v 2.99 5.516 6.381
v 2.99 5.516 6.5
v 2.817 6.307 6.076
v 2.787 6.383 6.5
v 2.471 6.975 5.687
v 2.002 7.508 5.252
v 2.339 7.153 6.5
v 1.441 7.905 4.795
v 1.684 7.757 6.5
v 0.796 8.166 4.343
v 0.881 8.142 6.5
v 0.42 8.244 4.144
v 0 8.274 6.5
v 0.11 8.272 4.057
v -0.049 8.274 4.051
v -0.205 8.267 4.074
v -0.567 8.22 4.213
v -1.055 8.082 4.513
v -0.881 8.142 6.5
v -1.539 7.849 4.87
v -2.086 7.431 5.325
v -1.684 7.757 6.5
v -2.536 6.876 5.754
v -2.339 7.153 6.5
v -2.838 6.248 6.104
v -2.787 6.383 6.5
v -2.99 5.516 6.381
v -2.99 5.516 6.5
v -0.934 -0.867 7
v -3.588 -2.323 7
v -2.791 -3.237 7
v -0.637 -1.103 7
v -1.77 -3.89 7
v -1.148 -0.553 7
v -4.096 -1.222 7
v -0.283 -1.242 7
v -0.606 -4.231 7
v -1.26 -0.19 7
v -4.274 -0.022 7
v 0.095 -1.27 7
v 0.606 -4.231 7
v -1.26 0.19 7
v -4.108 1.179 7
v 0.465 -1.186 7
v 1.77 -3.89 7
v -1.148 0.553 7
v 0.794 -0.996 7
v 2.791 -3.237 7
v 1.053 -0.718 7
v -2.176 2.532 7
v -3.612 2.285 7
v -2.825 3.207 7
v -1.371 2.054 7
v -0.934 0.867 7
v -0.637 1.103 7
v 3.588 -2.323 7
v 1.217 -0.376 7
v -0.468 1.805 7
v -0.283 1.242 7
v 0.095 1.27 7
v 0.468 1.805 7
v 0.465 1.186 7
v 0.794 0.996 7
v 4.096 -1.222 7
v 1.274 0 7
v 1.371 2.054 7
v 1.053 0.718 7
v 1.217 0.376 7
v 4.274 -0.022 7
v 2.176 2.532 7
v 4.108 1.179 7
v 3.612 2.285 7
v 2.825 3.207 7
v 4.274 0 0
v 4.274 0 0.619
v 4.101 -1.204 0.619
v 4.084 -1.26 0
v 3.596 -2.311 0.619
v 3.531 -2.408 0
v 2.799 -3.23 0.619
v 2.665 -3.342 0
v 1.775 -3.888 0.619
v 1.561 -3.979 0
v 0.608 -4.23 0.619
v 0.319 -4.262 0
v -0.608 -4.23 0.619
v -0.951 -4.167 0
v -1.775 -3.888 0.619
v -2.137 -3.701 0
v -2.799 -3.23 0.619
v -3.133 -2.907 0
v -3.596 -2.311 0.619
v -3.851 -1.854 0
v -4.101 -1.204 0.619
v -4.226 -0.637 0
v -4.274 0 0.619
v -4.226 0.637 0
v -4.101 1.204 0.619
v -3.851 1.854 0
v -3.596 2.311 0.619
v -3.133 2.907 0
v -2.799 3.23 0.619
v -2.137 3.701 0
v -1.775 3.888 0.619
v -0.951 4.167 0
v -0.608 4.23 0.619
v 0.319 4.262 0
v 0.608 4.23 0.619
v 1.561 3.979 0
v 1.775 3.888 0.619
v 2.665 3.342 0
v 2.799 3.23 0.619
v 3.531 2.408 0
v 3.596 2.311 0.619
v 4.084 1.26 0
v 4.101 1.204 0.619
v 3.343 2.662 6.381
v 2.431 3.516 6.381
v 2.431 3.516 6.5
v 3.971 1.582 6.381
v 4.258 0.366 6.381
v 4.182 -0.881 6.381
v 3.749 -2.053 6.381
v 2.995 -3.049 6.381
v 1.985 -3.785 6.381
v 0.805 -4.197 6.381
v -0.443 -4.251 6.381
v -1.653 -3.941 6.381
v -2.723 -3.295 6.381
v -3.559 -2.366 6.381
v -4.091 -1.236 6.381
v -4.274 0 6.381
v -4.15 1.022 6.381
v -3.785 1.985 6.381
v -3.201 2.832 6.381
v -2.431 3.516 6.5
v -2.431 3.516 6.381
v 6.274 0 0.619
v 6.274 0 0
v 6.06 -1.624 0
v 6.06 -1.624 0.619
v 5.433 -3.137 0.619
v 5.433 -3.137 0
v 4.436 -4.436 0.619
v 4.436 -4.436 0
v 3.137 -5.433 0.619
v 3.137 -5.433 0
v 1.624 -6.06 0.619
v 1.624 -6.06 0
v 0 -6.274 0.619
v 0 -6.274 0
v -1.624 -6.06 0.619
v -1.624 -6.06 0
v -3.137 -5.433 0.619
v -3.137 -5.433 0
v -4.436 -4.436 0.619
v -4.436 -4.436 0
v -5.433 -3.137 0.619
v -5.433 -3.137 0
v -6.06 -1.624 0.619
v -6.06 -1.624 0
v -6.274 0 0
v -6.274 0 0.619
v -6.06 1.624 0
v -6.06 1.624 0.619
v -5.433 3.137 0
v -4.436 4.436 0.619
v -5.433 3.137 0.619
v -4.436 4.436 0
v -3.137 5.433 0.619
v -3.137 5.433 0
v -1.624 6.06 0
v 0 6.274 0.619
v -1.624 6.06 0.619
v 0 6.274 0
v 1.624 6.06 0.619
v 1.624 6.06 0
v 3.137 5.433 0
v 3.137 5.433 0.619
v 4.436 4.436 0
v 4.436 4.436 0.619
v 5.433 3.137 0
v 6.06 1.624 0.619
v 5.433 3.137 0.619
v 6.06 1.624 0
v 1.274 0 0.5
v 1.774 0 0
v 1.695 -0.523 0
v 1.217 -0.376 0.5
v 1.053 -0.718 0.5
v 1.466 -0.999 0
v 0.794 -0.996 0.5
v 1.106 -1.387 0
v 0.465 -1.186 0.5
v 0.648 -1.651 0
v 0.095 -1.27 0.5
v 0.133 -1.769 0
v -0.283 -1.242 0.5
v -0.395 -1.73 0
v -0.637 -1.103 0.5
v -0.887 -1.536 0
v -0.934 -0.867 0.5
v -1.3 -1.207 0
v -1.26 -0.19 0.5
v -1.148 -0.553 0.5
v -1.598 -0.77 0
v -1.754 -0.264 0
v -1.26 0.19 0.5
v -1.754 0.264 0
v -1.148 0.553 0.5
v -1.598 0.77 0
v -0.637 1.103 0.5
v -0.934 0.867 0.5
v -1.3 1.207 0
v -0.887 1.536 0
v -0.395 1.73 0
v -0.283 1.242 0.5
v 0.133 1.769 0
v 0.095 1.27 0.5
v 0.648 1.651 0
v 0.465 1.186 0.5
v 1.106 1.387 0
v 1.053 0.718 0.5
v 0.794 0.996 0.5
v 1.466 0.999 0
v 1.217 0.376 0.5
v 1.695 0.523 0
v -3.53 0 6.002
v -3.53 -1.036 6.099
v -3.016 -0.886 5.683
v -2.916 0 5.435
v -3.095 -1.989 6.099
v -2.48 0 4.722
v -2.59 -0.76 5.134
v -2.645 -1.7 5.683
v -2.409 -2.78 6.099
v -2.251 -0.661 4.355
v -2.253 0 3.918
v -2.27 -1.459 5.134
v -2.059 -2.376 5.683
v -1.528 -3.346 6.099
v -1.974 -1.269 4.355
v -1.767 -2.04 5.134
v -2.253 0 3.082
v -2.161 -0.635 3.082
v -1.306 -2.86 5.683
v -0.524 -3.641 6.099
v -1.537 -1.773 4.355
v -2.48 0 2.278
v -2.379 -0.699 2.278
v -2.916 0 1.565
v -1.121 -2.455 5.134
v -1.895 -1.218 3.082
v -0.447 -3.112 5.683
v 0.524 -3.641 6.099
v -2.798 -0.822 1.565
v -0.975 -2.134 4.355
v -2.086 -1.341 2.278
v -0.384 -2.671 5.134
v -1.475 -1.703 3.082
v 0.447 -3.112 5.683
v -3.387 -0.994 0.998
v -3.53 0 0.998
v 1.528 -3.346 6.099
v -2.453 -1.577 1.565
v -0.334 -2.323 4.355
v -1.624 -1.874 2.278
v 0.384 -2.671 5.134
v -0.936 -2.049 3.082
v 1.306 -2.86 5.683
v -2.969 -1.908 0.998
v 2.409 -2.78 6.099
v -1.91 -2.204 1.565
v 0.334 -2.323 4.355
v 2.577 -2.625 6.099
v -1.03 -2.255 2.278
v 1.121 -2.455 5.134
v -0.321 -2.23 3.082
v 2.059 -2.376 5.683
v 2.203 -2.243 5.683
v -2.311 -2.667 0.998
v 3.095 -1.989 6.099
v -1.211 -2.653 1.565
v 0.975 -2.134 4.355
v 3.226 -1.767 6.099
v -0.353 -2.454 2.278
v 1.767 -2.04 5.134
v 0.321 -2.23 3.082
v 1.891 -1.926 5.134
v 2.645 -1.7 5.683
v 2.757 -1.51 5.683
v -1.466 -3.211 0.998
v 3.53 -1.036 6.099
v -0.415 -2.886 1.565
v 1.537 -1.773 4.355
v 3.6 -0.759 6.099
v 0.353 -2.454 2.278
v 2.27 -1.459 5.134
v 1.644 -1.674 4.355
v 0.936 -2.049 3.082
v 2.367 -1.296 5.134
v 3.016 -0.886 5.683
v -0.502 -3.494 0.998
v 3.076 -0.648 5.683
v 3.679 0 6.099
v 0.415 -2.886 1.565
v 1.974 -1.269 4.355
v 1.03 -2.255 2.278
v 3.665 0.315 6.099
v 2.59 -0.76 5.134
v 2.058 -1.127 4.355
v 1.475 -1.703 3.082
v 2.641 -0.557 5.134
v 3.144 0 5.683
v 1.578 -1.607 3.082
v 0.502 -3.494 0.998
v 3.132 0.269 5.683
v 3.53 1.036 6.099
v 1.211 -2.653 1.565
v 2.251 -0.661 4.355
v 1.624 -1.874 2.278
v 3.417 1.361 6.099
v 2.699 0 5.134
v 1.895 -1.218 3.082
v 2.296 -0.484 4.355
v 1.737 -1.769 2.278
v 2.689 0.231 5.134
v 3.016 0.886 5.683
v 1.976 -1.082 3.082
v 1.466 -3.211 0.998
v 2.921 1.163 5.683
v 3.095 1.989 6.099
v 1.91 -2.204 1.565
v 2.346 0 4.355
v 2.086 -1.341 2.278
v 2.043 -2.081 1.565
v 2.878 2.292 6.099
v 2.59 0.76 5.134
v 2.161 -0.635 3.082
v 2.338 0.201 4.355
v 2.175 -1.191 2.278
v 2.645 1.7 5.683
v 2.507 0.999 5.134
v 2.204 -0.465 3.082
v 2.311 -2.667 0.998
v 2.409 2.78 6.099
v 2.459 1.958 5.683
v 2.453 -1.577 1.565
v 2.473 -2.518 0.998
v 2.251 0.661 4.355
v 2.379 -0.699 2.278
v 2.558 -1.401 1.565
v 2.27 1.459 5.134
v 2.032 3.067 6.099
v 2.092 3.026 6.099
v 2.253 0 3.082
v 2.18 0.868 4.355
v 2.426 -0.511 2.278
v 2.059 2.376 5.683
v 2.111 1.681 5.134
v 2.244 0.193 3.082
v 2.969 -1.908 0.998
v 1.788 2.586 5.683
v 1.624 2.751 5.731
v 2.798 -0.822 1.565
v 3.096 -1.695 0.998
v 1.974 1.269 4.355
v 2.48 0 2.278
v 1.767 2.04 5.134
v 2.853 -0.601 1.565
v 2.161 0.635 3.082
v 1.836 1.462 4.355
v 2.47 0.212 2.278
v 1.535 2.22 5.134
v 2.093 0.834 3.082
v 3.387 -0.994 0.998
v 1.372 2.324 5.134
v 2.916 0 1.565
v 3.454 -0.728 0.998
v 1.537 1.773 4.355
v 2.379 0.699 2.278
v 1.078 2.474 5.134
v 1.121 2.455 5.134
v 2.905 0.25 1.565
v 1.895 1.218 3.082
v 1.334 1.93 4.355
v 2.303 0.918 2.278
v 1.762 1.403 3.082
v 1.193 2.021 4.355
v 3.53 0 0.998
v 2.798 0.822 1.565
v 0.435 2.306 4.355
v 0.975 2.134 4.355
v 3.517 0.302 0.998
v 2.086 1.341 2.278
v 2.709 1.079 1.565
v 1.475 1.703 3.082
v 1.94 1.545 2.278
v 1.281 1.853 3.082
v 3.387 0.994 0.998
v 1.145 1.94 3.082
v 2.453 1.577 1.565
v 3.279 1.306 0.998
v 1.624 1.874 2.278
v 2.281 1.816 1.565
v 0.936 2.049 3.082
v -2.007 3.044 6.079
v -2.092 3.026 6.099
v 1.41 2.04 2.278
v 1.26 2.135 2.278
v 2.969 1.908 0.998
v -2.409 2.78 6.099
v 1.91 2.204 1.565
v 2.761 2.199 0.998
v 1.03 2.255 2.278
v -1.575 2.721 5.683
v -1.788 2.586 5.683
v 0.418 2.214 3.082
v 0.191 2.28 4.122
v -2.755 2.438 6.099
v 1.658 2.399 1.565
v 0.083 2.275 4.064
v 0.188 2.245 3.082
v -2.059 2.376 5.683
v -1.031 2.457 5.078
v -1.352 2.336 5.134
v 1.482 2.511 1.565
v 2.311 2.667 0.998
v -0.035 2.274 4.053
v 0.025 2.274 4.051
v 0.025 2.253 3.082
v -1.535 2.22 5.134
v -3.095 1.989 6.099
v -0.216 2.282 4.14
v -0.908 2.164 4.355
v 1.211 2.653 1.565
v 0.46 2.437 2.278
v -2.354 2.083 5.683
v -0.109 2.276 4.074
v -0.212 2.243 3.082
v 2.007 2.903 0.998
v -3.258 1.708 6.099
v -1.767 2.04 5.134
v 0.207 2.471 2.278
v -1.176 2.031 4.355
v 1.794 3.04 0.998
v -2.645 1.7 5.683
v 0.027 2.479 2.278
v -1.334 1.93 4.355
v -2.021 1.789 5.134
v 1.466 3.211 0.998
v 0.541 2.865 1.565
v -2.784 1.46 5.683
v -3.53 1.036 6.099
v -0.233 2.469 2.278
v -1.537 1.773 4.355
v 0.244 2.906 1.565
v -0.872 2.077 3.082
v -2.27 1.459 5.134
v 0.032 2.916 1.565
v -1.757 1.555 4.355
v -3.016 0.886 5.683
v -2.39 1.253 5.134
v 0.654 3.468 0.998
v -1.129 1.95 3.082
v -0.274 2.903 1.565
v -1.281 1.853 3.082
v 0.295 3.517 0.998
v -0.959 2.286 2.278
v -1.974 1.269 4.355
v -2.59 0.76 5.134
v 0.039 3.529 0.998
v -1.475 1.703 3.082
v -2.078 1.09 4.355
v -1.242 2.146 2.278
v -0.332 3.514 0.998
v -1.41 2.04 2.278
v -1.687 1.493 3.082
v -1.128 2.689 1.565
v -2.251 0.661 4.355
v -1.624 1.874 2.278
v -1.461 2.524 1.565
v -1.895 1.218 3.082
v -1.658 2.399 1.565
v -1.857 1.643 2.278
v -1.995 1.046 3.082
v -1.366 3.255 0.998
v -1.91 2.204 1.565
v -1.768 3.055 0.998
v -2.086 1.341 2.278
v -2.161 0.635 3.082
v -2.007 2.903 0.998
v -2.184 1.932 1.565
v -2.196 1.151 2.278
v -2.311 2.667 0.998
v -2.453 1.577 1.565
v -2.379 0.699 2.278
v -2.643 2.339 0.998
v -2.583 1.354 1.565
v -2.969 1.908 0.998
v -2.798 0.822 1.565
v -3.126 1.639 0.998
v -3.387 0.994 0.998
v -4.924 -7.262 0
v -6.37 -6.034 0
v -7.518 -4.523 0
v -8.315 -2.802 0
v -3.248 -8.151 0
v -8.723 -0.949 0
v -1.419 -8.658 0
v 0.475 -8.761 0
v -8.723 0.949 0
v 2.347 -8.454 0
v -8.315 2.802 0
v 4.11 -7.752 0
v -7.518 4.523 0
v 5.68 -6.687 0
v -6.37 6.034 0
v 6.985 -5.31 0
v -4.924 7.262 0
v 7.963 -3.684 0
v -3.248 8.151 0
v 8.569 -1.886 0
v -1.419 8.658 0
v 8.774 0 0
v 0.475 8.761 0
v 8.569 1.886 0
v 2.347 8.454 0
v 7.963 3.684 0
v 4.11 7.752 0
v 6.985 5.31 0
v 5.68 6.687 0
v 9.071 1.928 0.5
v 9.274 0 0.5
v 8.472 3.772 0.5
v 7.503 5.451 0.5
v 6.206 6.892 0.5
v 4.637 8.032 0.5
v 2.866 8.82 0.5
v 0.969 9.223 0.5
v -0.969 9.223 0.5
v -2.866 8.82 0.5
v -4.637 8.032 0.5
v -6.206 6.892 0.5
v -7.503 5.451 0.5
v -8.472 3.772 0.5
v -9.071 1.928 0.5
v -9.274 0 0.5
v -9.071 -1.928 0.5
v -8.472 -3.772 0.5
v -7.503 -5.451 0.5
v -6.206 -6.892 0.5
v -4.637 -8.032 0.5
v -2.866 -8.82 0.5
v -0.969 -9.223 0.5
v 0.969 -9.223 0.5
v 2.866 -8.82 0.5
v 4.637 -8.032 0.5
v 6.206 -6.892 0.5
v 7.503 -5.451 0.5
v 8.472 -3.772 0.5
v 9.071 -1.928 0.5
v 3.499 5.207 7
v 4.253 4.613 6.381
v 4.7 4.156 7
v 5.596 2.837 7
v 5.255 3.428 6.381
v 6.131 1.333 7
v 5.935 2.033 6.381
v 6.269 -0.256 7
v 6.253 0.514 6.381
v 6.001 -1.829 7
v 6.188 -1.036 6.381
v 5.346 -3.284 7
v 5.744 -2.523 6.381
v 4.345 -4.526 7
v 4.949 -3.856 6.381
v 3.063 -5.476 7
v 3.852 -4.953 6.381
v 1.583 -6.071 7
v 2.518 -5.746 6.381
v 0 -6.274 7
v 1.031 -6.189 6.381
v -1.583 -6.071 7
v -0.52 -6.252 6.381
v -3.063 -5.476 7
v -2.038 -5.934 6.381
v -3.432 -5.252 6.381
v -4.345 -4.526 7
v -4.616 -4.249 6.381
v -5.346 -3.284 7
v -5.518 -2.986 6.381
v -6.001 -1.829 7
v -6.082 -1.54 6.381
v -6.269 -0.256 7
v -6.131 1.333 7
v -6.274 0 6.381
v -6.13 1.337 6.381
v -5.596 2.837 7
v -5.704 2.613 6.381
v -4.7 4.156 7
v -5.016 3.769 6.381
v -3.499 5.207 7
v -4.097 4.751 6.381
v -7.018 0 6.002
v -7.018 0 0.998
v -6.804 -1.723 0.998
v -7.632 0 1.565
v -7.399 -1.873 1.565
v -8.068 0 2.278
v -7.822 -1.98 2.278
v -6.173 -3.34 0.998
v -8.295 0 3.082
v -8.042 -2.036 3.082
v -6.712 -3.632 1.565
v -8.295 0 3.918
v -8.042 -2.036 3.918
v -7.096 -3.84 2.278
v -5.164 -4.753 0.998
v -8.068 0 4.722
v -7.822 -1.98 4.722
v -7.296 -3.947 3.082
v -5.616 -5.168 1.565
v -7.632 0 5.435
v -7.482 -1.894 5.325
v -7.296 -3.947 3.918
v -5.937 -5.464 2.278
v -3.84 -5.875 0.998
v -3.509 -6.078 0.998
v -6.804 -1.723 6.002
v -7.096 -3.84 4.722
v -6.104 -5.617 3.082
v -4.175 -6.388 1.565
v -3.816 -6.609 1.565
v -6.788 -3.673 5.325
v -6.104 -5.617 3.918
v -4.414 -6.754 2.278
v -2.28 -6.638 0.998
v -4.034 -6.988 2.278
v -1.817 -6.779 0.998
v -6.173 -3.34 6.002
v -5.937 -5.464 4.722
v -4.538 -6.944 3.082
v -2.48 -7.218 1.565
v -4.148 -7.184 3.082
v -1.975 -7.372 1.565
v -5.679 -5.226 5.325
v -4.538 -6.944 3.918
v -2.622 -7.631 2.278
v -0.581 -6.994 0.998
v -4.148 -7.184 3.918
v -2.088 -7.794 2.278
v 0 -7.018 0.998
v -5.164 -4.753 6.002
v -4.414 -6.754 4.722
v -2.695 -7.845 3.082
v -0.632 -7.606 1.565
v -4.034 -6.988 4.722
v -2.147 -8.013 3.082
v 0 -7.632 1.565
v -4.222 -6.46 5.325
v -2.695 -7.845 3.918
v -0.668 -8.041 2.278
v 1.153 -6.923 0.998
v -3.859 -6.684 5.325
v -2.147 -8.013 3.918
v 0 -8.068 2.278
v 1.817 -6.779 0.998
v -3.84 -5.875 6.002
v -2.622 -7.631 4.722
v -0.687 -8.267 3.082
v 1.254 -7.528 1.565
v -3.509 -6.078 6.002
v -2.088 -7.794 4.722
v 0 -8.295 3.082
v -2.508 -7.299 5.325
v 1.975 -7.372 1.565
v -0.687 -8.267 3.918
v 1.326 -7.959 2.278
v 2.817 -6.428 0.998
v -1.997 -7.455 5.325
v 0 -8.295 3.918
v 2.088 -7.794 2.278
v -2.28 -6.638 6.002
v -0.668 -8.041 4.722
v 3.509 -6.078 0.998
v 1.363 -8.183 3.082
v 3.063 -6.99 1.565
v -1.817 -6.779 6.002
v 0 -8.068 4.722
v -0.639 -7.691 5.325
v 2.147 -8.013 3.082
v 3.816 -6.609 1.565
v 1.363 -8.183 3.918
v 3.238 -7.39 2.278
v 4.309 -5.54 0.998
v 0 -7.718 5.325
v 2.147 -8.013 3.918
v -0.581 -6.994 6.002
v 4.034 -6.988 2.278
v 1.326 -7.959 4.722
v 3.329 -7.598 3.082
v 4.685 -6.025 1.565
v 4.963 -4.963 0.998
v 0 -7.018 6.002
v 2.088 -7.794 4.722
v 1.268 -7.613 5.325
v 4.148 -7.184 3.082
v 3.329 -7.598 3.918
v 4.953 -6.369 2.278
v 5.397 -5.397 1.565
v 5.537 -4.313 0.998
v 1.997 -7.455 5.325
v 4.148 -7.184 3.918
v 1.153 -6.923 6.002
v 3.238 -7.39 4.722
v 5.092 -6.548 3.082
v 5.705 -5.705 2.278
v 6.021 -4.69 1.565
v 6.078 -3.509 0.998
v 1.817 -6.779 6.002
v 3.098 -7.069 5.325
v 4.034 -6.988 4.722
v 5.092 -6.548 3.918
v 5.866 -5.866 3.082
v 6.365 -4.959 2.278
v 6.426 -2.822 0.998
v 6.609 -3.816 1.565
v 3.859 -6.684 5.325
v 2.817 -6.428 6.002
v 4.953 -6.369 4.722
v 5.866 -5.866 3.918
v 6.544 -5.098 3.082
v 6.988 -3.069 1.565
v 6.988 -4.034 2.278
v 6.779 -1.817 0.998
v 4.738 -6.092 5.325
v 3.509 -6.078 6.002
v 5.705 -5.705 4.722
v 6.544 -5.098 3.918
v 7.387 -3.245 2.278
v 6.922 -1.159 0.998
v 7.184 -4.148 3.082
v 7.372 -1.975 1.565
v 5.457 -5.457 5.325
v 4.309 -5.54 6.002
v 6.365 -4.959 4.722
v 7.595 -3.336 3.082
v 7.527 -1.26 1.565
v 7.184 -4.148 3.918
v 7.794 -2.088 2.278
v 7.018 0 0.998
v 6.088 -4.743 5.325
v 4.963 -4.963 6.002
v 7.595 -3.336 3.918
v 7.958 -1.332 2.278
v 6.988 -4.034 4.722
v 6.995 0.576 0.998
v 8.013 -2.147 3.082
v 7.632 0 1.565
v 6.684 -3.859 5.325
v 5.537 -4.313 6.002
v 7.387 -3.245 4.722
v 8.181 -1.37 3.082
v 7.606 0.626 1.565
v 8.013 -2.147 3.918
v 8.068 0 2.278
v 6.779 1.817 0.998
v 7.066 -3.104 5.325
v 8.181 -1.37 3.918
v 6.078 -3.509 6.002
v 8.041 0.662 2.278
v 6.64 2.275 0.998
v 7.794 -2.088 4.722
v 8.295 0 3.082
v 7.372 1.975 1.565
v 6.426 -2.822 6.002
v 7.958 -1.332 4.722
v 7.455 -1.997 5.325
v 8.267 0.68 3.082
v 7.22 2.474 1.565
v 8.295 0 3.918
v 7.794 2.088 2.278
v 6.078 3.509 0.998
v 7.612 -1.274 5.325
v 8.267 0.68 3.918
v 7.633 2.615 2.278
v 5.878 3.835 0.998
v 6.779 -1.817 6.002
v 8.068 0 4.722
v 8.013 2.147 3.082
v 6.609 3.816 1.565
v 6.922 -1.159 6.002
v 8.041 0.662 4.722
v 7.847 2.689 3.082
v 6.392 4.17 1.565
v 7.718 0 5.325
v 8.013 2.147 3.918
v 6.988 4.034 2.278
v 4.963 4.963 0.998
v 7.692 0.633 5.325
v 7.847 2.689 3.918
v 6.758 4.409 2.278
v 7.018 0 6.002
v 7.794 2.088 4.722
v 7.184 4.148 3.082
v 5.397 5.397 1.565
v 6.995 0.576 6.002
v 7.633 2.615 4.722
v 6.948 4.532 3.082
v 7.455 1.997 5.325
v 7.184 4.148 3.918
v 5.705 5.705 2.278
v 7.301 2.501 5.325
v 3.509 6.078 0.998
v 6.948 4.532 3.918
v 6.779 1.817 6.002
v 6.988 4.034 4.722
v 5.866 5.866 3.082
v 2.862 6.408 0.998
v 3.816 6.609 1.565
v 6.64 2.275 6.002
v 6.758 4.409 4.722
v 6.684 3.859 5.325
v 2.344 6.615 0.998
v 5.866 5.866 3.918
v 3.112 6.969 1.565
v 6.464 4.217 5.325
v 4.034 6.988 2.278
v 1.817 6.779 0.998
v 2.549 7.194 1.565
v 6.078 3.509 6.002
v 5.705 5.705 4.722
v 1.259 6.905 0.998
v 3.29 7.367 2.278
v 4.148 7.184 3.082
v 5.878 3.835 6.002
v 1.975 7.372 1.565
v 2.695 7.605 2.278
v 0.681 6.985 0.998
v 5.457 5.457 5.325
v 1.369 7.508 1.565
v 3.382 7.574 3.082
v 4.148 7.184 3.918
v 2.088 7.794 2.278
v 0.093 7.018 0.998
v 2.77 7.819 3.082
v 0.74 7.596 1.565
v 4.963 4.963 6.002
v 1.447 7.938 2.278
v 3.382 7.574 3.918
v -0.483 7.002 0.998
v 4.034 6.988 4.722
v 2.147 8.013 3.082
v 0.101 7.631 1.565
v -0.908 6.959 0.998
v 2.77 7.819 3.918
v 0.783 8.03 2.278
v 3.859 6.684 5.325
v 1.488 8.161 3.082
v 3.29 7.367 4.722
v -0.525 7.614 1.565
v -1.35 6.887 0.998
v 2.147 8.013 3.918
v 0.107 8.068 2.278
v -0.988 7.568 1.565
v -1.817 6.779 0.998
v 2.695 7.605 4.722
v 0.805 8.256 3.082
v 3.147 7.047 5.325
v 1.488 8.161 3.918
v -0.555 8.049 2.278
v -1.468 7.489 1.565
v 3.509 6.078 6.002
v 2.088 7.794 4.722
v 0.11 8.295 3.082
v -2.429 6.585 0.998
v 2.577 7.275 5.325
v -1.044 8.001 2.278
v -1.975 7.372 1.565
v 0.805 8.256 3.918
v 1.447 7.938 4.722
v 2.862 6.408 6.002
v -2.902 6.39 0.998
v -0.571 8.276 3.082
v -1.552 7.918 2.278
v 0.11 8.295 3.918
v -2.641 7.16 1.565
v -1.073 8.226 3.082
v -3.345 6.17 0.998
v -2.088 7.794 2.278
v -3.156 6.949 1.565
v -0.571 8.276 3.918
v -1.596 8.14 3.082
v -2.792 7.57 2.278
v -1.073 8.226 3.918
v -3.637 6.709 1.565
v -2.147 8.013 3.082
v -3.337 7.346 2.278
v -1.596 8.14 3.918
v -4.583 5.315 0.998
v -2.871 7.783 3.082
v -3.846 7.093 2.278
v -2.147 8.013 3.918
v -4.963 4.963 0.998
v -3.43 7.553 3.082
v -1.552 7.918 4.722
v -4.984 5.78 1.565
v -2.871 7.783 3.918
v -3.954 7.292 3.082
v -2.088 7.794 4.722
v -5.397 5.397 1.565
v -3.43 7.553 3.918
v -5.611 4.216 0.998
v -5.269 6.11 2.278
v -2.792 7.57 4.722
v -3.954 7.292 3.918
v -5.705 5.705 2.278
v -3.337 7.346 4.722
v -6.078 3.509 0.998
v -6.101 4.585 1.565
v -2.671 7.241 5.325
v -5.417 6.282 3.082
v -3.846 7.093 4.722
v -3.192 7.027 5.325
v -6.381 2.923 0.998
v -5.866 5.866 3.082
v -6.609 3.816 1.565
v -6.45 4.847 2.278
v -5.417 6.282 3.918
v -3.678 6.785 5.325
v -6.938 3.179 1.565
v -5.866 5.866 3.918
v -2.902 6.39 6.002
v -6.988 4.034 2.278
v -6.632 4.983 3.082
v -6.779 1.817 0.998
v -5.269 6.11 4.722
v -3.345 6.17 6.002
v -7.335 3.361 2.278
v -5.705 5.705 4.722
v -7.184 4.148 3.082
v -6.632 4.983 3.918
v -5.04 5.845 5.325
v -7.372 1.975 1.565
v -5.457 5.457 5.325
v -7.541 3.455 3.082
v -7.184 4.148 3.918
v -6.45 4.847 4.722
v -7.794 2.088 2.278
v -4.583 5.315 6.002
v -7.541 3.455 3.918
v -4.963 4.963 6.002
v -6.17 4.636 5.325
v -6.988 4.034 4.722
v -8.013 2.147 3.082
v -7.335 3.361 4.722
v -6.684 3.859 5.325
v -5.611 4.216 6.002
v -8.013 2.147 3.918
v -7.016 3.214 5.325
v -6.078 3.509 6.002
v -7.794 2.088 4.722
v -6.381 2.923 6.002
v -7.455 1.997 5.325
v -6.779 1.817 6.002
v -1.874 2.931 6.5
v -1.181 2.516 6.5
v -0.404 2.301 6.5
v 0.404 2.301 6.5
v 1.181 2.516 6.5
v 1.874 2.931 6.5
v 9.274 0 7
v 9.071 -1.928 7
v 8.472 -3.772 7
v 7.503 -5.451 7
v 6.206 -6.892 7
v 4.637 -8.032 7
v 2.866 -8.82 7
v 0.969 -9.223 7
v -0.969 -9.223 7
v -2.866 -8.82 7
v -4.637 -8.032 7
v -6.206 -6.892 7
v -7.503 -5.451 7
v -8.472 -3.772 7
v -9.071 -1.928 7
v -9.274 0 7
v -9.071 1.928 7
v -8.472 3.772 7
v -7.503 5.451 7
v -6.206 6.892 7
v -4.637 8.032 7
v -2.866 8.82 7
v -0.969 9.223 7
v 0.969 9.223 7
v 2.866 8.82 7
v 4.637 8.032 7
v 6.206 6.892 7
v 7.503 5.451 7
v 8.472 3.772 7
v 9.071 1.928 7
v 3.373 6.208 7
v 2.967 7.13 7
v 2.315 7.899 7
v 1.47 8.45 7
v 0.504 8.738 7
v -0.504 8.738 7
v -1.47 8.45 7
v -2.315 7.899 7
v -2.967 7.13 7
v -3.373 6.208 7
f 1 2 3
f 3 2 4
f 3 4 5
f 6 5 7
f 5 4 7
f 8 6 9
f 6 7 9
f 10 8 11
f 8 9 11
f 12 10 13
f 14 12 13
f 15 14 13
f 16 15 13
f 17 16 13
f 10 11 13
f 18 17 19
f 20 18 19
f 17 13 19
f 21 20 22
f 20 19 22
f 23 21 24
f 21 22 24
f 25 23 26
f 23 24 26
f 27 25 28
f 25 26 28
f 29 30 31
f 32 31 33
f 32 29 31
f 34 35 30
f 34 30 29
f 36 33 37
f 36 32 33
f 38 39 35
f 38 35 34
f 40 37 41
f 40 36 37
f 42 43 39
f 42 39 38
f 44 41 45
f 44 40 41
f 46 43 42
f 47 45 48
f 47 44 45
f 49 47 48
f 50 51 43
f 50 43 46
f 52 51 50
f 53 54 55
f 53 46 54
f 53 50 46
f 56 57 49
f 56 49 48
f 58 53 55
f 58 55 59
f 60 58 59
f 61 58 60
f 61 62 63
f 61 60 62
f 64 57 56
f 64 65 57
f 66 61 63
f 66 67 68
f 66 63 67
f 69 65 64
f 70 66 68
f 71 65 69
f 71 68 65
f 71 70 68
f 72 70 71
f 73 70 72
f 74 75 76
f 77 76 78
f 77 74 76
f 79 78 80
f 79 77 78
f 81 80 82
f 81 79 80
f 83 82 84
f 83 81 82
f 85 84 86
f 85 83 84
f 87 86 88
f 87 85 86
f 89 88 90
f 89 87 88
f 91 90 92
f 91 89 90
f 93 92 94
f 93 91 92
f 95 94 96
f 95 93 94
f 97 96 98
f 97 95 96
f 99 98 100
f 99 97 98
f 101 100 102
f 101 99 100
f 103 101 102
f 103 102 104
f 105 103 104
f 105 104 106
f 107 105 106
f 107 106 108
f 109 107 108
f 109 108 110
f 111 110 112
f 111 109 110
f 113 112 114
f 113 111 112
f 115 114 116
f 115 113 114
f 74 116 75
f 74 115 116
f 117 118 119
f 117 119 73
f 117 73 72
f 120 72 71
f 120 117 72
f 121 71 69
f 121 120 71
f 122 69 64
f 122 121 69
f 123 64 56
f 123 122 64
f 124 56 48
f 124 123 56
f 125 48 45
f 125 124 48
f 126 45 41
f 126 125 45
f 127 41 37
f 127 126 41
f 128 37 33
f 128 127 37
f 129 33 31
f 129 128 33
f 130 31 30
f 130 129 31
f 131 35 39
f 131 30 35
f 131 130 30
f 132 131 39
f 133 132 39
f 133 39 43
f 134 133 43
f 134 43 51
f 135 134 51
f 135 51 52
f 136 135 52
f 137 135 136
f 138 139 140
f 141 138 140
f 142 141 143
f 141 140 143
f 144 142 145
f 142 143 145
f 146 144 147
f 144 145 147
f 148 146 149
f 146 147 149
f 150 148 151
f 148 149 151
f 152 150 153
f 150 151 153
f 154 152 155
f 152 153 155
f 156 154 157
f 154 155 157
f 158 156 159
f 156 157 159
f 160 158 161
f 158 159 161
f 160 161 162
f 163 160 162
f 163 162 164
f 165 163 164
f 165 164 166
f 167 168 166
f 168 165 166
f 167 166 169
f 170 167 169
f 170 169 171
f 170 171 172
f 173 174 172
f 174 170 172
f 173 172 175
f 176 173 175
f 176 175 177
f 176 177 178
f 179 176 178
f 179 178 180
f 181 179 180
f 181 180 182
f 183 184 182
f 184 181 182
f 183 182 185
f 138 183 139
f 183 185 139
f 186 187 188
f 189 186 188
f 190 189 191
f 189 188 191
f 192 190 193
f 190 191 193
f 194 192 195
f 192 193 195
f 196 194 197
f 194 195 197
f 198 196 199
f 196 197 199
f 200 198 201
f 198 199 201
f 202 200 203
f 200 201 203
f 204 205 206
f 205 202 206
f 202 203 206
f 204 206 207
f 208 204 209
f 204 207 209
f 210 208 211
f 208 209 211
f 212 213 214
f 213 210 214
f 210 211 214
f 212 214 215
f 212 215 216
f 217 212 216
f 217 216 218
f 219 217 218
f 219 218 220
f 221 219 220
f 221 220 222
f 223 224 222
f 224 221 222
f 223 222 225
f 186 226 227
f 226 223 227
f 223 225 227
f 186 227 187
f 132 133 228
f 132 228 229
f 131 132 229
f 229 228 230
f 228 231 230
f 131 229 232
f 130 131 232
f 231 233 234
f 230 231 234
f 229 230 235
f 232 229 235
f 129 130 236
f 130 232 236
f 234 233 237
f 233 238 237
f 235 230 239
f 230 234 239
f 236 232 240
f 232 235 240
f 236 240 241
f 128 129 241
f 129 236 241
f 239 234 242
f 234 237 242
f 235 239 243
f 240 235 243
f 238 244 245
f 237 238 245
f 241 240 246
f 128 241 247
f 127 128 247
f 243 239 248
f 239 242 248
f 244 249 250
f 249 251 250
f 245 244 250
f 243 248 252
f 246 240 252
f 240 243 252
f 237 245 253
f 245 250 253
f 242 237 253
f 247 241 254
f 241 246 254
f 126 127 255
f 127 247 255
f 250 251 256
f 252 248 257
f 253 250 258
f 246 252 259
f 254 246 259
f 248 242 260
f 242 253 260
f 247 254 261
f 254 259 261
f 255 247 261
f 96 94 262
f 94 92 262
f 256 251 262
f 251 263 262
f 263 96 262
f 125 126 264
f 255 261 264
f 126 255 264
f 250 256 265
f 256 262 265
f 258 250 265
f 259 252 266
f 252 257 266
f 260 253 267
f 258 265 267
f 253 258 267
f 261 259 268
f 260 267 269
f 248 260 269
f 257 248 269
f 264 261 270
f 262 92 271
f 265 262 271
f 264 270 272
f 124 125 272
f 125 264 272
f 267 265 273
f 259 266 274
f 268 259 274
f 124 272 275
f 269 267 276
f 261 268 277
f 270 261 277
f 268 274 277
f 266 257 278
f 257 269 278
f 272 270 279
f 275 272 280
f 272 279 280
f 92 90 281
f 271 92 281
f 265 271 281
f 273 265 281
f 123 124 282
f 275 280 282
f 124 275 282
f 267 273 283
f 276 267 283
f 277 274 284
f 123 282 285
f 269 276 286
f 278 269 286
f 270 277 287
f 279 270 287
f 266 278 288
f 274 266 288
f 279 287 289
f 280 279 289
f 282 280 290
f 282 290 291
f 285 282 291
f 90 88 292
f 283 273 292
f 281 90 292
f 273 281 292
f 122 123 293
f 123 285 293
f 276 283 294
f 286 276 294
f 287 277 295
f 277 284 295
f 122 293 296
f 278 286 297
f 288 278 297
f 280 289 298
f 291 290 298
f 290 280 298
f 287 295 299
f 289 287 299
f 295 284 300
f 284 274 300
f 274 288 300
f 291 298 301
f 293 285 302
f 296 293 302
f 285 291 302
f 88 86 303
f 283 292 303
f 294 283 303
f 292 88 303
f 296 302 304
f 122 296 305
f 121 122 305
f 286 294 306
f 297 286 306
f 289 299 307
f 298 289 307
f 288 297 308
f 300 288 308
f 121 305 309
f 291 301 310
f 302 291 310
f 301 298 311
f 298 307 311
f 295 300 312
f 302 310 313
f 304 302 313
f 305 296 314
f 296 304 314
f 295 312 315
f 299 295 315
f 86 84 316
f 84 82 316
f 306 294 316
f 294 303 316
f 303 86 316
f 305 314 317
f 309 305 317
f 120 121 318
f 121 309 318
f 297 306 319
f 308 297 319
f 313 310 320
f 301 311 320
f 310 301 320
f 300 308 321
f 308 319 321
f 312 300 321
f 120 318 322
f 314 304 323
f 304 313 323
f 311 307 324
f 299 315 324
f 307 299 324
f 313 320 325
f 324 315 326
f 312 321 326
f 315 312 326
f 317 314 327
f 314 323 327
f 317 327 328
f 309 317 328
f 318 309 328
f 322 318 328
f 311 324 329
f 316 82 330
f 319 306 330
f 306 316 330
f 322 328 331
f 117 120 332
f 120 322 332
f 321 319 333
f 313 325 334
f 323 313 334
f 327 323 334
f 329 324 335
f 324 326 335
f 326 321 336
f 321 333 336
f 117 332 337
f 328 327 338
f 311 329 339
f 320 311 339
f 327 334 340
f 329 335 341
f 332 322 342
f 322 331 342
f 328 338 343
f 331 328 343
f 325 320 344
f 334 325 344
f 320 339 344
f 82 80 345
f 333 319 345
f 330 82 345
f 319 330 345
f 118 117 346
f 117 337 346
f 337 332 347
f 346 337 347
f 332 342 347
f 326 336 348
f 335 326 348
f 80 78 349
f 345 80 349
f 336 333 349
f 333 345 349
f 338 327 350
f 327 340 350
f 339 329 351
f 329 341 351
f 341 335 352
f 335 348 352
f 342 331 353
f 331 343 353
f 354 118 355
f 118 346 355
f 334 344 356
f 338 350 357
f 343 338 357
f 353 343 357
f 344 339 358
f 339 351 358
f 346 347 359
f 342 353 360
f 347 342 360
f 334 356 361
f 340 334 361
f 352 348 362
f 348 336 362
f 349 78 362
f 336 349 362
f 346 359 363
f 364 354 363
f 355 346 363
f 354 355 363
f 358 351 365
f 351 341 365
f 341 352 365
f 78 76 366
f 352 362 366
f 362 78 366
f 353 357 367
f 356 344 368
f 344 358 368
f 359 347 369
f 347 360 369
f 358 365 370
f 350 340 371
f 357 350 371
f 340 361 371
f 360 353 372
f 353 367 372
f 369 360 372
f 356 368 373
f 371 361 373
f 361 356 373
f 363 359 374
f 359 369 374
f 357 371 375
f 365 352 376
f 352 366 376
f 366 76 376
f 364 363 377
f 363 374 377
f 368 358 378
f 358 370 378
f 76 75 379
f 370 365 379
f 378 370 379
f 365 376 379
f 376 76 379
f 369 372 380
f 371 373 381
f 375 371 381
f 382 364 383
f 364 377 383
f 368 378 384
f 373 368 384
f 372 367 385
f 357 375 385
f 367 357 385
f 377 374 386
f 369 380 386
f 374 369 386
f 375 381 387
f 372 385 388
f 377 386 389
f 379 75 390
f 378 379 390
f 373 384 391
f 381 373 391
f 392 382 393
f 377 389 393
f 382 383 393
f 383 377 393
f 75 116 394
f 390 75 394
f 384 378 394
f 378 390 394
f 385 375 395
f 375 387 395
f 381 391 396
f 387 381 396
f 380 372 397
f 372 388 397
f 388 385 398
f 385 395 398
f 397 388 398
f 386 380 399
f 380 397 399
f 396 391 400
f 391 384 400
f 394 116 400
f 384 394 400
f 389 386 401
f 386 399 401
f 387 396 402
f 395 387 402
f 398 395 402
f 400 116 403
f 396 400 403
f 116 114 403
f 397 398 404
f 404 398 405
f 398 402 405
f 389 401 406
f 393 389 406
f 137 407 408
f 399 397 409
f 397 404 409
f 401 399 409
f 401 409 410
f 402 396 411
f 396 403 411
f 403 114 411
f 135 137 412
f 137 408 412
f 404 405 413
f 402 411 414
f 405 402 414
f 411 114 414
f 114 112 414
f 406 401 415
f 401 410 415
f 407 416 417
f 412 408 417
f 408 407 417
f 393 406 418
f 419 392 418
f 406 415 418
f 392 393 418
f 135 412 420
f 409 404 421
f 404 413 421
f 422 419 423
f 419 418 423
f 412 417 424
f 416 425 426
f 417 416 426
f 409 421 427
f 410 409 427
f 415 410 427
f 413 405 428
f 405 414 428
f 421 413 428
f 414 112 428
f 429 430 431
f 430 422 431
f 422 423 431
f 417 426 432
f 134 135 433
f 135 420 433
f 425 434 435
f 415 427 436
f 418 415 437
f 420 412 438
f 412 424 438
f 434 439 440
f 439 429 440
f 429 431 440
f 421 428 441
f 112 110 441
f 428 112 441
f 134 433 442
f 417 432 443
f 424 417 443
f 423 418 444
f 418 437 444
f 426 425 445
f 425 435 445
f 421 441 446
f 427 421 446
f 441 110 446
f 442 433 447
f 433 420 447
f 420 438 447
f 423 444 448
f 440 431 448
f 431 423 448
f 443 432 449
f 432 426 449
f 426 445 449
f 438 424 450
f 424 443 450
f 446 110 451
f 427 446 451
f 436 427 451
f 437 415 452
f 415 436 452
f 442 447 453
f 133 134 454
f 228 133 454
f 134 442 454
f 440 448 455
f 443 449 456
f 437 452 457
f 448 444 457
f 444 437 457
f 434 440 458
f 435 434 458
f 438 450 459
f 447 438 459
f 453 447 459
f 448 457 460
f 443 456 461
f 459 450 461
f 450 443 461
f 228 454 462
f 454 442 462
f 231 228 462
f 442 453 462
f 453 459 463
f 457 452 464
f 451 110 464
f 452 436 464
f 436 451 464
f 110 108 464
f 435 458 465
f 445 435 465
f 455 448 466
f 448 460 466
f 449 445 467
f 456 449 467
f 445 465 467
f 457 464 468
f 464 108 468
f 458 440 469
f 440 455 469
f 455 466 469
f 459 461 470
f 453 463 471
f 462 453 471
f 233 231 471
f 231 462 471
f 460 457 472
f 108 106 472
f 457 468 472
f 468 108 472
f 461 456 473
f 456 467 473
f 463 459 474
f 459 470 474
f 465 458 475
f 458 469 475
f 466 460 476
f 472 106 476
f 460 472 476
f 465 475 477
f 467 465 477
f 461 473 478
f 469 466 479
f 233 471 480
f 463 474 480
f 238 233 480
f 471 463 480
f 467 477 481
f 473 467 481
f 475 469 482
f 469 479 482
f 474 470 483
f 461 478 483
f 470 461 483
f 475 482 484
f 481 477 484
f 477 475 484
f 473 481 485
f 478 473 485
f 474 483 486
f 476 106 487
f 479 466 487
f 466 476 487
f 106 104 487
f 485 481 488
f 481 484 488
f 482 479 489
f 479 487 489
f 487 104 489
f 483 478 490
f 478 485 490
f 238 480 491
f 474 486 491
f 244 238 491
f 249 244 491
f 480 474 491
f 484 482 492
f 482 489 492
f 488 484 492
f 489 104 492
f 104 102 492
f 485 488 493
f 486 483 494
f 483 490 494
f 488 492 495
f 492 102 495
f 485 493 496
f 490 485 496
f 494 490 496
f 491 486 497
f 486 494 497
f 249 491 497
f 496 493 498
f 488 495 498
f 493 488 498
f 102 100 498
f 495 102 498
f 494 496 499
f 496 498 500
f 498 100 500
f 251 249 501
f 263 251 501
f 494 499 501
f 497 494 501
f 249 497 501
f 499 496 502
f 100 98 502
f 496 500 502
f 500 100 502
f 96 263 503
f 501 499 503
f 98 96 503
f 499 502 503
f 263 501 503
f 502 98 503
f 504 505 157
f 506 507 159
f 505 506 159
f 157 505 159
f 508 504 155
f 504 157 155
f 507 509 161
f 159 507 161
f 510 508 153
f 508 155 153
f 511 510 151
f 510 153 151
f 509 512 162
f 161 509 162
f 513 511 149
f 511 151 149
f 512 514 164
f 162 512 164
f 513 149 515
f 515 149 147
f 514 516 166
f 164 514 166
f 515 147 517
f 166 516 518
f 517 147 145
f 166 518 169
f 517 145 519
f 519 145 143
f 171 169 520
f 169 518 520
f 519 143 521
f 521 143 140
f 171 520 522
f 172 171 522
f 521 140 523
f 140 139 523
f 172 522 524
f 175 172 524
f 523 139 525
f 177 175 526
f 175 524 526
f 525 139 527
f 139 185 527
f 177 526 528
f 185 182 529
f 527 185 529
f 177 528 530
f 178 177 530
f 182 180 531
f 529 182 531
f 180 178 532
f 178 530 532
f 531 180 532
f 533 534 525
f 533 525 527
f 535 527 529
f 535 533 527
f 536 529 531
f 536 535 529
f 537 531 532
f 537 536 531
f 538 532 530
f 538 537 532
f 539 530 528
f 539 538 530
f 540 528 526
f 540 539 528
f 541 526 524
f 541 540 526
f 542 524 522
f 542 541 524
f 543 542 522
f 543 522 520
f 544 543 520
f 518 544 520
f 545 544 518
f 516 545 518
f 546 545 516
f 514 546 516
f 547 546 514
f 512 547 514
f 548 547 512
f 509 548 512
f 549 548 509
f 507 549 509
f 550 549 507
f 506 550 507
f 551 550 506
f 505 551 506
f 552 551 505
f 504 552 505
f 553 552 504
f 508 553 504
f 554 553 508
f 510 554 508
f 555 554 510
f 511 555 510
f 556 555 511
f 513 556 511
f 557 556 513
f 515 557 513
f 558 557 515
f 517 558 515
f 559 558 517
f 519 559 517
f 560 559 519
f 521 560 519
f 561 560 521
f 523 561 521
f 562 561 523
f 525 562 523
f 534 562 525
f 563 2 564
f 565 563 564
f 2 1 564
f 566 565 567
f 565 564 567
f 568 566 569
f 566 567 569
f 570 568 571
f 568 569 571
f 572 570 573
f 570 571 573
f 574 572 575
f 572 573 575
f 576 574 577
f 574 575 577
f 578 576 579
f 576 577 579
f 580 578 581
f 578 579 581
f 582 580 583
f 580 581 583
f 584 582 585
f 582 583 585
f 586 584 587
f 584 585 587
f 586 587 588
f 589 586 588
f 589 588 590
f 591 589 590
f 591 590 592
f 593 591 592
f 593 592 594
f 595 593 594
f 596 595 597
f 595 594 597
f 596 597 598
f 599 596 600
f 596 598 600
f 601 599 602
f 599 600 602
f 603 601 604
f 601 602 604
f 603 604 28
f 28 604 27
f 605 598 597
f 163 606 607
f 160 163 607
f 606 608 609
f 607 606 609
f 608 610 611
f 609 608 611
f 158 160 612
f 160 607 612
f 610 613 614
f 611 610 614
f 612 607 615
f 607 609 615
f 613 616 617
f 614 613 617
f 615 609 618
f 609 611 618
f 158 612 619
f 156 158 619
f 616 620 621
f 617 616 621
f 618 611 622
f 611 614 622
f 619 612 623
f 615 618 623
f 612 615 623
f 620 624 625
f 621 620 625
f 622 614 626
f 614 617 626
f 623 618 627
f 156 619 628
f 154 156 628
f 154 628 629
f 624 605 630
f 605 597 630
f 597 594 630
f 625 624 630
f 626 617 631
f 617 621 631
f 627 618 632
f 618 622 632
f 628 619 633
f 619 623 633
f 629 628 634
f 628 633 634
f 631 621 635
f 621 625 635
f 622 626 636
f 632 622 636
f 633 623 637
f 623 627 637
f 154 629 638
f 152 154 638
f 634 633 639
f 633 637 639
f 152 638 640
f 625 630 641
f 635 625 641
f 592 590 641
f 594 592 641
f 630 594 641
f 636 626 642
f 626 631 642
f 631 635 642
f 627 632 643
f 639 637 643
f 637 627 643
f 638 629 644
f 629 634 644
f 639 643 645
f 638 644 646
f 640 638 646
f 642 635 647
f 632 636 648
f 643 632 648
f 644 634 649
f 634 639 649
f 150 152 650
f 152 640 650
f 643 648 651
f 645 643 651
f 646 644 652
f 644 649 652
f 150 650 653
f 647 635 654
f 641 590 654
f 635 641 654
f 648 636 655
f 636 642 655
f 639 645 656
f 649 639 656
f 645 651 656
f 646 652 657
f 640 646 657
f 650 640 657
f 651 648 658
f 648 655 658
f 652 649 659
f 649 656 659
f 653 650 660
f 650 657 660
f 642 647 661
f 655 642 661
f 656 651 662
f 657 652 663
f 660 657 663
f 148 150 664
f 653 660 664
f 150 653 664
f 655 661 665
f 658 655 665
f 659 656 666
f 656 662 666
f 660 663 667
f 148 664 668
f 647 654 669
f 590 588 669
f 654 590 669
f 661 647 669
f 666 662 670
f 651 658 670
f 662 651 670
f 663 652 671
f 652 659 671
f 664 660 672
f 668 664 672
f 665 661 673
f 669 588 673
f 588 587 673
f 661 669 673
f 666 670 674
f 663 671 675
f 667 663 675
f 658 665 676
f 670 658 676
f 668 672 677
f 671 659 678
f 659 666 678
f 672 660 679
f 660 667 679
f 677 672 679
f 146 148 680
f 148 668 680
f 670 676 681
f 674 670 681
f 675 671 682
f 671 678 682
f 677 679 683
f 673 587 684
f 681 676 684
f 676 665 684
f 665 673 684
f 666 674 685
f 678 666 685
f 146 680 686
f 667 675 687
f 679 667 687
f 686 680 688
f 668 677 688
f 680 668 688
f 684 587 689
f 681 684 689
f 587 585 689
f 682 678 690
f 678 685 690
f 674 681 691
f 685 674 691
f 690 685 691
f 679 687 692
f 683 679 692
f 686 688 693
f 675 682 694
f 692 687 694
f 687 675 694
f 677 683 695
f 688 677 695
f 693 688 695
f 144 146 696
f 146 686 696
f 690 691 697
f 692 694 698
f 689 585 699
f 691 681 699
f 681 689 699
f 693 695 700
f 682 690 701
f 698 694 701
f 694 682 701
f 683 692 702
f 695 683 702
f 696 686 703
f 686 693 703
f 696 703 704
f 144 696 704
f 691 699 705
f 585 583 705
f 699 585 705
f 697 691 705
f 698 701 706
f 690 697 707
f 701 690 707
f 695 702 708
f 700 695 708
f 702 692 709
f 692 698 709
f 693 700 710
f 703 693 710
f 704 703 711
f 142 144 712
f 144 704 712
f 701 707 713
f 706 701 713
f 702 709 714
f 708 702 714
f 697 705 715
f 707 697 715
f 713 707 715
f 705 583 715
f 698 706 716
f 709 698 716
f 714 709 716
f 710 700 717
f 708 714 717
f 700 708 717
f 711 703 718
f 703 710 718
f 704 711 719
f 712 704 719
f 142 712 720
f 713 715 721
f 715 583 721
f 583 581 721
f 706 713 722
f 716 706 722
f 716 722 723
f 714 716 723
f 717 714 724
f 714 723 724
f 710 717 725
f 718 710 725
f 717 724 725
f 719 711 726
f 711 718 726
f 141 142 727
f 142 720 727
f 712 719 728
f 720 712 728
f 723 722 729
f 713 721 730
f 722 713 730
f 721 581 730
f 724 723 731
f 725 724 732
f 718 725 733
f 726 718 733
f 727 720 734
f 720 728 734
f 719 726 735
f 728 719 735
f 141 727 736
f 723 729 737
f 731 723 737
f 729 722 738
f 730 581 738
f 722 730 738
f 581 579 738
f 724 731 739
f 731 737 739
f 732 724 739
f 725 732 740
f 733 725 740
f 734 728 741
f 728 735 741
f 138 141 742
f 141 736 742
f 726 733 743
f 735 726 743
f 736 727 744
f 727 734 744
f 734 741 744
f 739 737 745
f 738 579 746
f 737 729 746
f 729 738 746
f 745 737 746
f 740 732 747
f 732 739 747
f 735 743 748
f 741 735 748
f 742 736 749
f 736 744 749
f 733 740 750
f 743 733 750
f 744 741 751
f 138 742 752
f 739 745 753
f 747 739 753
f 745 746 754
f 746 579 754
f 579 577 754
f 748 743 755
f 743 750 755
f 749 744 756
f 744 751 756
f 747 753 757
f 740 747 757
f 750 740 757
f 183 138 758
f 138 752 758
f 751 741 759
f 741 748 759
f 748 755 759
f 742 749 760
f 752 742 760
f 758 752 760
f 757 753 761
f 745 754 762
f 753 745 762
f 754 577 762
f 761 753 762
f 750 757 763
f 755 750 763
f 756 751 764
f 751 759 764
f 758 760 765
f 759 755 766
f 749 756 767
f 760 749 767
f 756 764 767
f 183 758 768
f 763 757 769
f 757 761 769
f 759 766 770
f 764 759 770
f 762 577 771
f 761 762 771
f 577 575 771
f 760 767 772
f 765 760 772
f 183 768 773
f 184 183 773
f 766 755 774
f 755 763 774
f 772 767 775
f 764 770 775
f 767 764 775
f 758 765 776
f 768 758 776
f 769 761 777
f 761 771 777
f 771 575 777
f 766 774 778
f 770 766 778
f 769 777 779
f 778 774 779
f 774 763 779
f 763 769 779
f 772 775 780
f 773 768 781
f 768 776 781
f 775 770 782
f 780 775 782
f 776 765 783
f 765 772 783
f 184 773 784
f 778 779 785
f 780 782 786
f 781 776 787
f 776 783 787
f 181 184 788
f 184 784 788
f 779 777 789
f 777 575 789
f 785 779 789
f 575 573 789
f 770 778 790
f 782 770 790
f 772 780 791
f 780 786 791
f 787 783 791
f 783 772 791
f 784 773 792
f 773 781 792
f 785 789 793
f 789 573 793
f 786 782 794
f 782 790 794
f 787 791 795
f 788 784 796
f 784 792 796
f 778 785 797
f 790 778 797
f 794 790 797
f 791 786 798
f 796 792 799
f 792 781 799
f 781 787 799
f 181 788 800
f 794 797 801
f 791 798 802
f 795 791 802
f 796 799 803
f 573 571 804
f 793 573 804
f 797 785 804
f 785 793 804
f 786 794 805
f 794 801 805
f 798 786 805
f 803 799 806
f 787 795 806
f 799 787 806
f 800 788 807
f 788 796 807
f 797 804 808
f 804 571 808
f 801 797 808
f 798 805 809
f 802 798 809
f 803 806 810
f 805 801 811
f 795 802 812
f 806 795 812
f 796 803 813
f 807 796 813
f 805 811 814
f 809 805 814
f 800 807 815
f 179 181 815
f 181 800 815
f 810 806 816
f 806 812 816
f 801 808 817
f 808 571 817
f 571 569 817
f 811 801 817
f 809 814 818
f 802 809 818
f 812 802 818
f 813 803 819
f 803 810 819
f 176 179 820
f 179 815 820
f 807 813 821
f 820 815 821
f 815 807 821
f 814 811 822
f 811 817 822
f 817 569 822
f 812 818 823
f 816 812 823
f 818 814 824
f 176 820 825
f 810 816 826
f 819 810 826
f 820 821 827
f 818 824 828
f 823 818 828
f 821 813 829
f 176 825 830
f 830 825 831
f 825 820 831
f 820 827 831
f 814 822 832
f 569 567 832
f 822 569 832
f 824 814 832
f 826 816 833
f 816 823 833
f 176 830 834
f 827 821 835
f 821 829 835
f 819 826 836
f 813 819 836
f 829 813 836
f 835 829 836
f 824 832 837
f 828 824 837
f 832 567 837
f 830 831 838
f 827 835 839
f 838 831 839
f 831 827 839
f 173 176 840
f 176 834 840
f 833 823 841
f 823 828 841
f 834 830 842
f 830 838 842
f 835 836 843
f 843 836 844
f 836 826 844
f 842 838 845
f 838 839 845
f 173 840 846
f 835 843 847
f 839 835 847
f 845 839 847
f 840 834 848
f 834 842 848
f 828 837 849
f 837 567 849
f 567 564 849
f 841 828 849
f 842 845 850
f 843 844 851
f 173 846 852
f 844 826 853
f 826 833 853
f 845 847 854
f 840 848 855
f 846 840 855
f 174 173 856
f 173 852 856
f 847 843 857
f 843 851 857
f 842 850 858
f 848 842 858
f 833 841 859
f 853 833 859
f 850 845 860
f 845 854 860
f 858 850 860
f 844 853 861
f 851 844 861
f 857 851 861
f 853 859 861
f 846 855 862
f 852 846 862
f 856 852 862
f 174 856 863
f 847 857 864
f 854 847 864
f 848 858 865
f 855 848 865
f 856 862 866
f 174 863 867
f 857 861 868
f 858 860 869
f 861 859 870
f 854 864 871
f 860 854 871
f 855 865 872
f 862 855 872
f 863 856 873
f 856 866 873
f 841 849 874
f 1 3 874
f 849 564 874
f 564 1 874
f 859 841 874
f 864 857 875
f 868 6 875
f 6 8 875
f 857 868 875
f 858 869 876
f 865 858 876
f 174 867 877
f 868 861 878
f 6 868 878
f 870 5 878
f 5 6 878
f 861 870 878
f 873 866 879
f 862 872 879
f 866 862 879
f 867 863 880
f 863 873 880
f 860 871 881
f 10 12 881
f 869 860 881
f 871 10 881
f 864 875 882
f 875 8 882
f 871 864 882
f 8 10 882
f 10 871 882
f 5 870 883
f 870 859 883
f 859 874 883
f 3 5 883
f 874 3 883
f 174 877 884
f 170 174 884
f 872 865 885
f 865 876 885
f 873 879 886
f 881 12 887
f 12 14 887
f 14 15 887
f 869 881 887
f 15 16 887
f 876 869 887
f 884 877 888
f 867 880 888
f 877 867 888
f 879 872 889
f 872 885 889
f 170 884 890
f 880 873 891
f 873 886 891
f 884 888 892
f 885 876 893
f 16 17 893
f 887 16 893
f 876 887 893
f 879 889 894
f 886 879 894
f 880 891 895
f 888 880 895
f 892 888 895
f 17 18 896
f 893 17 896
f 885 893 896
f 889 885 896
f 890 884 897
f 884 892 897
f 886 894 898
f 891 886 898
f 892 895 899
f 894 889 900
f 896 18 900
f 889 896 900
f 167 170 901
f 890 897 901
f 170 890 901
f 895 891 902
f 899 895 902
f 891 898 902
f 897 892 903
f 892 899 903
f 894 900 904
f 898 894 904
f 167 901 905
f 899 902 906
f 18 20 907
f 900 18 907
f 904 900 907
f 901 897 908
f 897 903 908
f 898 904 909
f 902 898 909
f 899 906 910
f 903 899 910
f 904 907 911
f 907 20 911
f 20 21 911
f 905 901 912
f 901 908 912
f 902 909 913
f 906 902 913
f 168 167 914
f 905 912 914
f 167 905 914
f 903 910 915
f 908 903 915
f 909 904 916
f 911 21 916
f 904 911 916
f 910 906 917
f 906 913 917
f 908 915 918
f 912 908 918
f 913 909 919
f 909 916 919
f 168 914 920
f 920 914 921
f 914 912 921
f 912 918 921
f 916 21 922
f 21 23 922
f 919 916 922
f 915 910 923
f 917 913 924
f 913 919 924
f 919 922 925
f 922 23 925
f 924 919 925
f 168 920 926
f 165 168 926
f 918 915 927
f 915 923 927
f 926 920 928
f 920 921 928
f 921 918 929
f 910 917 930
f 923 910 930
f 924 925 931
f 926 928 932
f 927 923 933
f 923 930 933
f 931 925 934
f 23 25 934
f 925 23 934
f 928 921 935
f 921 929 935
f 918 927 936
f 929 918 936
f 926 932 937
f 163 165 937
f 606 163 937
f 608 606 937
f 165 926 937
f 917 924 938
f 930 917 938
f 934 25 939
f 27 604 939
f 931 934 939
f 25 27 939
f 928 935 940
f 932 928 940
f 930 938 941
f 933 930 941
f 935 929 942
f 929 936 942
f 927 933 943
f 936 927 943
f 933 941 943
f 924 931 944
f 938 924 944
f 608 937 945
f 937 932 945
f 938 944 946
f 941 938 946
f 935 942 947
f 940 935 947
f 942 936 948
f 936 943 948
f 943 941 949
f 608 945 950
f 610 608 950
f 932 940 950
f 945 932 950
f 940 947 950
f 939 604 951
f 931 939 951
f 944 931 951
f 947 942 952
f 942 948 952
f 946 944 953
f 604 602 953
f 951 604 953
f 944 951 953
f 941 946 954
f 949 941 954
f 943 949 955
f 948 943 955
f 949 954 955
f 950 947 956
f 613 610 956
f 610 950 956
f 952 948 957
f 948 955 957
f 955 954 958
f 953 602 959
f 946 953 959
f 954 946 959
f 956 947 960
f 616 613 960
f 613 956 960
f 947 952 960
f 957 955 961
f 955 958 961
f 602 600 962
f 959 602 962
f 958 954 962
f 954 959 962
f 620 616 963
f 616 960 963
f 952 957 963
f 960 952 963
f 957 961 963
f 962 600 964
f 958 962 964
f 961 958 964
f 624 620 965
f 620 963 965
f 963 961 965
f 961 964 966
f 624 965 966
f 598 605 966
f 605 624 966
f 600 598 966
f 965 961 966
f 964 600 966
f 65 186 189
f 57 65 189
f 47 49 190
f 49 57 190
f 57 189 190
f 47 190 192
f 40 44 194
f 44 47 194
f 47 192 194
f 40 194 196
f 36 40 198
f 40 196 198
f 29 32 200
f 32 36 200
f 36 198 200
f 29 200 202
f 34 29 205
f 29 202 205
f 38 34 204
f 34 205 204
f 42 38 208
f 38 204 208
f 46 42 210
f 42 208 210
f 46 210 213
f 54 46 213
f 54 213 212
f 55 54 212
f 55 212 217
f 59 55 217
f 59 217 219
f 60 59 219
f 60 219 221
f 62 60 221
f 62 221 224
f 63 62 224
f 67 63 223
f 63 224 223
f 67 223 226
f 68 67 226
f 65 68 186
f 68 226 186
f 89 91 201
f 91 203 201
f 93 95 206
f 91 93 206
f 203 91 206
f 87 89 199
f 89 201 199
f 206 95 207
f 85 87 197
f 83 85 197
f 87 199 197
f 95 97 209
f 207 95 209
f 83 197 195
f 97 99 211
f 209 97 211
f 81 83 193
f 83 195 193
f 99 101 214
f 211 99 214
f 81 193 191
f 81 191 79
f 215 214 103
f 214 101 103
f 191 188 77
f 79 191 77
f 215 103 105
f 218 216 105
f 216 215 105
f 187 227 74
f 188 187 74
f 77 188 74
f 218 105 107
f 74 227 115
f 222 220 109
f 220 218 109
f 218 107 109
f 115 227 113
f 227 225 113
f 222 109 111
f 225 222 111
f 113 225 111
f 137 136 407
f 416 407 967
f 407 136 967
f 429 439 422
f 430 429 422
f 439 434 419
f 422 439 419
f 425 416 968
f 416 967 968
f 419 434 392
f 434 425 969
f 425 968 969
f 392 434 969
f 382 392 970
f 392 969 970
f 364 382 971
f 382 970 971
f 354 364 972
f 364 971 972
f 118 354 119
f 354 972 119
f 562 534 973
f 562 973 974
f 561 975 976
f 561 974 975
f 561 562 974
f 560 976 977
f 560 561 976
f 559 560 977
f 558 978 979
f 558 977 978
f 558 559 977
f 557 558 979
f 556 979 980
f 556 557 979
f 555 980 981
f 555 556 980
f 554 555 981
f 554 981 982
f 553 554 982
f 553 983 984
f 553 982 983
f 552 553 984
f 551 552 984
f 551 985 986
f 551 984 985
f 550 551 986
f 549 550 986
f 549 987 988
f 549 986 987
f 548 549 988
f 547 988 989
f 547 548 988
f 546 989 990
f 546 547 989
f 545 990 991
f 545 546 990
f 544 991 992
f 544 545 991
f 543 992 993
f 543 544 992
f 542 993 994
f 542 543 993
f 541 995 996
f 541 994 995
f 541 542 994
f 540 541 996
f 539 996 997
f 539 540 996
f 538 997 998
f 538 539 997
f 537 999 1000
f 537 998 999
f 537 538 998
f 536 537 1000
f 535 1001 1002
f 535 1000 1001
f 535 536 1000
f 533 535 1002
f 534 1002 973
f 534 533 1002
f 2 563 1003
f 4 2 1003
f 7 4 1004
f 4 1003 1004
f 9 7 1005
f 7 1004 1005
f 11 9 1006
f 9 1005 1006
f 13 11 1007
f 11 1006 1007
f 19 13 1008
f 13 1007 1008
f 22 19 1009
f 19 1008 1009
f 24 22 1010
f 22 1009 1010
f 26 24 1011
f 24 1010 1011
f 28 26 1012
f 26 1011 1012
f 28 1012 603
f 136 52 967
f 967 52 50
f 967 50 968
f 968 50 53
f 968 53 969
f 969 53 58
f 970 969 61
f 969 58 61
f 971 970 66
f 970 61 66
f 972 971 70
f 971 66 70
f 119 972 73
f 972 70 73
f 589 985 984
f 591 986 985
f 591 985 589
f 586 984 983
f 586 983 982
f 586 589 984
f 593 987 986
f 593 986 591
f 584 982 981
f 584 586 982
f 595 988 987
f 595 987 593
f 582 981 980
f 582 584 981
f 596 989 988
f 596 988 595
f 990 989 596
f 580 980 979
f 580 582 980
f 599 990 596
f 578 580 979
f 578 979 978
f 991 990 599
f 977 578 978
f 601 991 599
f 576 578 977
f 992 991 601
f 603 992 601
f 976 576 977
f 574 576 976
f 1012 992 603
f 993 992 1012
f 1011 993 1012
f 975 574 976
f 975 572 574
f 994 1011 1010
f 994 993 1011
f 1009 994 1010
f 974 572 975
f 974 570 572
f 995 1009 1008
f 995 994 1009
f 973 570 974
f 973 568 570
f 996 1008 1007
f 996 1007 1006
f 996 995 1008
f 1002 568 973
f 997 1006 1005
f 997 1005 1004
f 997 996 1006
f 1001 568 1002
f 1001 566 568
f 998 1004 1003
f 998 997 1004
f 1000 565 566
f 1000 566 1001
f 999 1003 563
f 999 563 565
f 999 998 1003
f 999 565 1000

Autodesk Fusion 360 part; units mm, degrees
sketch "Sketch4" plane through (0, 0, 0) normal (0, 0, 1) x (1, 0, 0) in component "Bearing"
  circle A0 centre (0, 0) radius 1.274
  circle A1 centre (0, 0) radius 4.274
  circle A2 centre (0, 0) radius 6.274
  circle A3 centre (0, 0) radius 9.274
  dimension "d27" = 2.5481
  dimension "d28" = 8.5481
  dimension "d29" = 12.5481
  dimension "d30" = 18.5481
extrude "Extrude3" add sketch "Sketch4" along normal blind 7 makes body 1 at (4.2528, -0.4256, 4.6667) makes body 2 at (9.2625, -0.4623, 2.3333) in component "Bearing"
sketch "Sketch5" plane through (0, 0, 0) normal (0, 1, 0) x (1, 0, 0) in component "Bearing"
  line L0 (1.274, -7) -> (-1.274, -7) construction
  line L1 (1.274, 0) -> (-1.274, 0) construction
  line L2 (0, -7) -> (0, 0) construction
  line L3 (-5.274, -7) -> (-5.274, 0) construction
  circle A0 centre (-5.274, -3.5) radius 3.05
  dimension "d33" = 5.274
  dimension "d34" = 6.1
revolve "Revolve2" cut sketch "Sketch5" angle 360 about axis through (0, 0, 7) along (0, 0, -1) bodies 1 2 in component "Bearing"
sketch "Sketch6" plane through (0, 0, 7) normal (0, 0, 1) x (-1, 0, 0) in component "Bearing"
  circle A0 centre (0, 0) radius 6.274
  circle A1 centre (0, 0) radius 9.274
  line L0 (0, 0) -> (0, -9.274) construction
  circle A2 centre (0, -5.274) radius 3
  dimension "d36" = 9.274
  dimension "d37" = 6
  dimension "d38" = 5.274
extrude "Extrude4" cut sketch "Sketch6" against normal blind 3.5 contours A0 A2 | A0 A2 picked at (-0.0403, -4.931) picked at (0, -6.9302) bodies 1 2 in component "Bearing"
chamfer "Chamfer2" distance 0.5 angle 45 2 edges at (0, 8.274, 7) (0, 2.274, 7) on bodies 1 2 in component "Bearing"
chamfer "Chamfer3" distance 0.5 angle 45 2 edges at (-8.6464, -3.3536, 0) (-1.1878, 0.4607, 0) on bodies 1 2 in component "Bearing"
ref_plane "WorkPlane1" through (0, 0, 3.5) normal (0, 0, 1) x (1, 0, 0) in component "Bearing"
sketch "Sketch7" plane through (0, 0, 3.5) normal (0, 0, 1) x (1, 0, 0) in component "Bearing"
  circle A0 centre (0, 0) radius 5.274 construction
  line L0 (0, 0) -> (0, 5.274) construction
  circle A1 centre (0, 5.274) radius 3 construction
  circle A2 centre (-5.0159, 1.6298) radius 3 construction
  circle A3 centre (-3.1, -4.2668) radius 3 construction
  circle A4 centre (3.1, -4.2668) radius 3 construction
  circle A5 centre (5.0159, 1.6298) radius 3 construction
  dimension "d45" = 10.5481
  dimension "d46" = 6
  dimension "d48" = 360
component "Bearing" placed x (1, 0, 0) y (0, 1, 0) z (0, 0, 1) at (0, 0, 0)
equation "d = 6 mm" comment "ball dia"
equation "gap = 0.2 mm" comment "gap between balls"
equation "Nball = 5" comment "number of balls"
equation "D = ( d + 5 * gap / Nball ) / sin(( 180 / Nball ) * 1 deg)" comment "diameter of the ball to stay"
equation "innerinner = D - d - 2 mm"
equation "innerouter = D - 2 mm"
equation "outerinner = D + 2 mm"
equation "outerouter = D + d + 2 mm"
equation "d27 = innerinner"
equation "d28 = innerouter"
equation "d29 = outerinner"
equation "d30 = outerouter"
equation "d31 = height"
equation "d33 = D / 2"
equation "d34 = d + gap / 2"
equation "d36 = outerouter / 2"
equation "d37 = d"
equation "d38 = D / 2"
equation "height = 7 mm"
equation "d40 = -height / 2"
equation "d44 = height / 2"
equation "d45 = D"
equation "d46 = d"
equation "d47 = Nball"
